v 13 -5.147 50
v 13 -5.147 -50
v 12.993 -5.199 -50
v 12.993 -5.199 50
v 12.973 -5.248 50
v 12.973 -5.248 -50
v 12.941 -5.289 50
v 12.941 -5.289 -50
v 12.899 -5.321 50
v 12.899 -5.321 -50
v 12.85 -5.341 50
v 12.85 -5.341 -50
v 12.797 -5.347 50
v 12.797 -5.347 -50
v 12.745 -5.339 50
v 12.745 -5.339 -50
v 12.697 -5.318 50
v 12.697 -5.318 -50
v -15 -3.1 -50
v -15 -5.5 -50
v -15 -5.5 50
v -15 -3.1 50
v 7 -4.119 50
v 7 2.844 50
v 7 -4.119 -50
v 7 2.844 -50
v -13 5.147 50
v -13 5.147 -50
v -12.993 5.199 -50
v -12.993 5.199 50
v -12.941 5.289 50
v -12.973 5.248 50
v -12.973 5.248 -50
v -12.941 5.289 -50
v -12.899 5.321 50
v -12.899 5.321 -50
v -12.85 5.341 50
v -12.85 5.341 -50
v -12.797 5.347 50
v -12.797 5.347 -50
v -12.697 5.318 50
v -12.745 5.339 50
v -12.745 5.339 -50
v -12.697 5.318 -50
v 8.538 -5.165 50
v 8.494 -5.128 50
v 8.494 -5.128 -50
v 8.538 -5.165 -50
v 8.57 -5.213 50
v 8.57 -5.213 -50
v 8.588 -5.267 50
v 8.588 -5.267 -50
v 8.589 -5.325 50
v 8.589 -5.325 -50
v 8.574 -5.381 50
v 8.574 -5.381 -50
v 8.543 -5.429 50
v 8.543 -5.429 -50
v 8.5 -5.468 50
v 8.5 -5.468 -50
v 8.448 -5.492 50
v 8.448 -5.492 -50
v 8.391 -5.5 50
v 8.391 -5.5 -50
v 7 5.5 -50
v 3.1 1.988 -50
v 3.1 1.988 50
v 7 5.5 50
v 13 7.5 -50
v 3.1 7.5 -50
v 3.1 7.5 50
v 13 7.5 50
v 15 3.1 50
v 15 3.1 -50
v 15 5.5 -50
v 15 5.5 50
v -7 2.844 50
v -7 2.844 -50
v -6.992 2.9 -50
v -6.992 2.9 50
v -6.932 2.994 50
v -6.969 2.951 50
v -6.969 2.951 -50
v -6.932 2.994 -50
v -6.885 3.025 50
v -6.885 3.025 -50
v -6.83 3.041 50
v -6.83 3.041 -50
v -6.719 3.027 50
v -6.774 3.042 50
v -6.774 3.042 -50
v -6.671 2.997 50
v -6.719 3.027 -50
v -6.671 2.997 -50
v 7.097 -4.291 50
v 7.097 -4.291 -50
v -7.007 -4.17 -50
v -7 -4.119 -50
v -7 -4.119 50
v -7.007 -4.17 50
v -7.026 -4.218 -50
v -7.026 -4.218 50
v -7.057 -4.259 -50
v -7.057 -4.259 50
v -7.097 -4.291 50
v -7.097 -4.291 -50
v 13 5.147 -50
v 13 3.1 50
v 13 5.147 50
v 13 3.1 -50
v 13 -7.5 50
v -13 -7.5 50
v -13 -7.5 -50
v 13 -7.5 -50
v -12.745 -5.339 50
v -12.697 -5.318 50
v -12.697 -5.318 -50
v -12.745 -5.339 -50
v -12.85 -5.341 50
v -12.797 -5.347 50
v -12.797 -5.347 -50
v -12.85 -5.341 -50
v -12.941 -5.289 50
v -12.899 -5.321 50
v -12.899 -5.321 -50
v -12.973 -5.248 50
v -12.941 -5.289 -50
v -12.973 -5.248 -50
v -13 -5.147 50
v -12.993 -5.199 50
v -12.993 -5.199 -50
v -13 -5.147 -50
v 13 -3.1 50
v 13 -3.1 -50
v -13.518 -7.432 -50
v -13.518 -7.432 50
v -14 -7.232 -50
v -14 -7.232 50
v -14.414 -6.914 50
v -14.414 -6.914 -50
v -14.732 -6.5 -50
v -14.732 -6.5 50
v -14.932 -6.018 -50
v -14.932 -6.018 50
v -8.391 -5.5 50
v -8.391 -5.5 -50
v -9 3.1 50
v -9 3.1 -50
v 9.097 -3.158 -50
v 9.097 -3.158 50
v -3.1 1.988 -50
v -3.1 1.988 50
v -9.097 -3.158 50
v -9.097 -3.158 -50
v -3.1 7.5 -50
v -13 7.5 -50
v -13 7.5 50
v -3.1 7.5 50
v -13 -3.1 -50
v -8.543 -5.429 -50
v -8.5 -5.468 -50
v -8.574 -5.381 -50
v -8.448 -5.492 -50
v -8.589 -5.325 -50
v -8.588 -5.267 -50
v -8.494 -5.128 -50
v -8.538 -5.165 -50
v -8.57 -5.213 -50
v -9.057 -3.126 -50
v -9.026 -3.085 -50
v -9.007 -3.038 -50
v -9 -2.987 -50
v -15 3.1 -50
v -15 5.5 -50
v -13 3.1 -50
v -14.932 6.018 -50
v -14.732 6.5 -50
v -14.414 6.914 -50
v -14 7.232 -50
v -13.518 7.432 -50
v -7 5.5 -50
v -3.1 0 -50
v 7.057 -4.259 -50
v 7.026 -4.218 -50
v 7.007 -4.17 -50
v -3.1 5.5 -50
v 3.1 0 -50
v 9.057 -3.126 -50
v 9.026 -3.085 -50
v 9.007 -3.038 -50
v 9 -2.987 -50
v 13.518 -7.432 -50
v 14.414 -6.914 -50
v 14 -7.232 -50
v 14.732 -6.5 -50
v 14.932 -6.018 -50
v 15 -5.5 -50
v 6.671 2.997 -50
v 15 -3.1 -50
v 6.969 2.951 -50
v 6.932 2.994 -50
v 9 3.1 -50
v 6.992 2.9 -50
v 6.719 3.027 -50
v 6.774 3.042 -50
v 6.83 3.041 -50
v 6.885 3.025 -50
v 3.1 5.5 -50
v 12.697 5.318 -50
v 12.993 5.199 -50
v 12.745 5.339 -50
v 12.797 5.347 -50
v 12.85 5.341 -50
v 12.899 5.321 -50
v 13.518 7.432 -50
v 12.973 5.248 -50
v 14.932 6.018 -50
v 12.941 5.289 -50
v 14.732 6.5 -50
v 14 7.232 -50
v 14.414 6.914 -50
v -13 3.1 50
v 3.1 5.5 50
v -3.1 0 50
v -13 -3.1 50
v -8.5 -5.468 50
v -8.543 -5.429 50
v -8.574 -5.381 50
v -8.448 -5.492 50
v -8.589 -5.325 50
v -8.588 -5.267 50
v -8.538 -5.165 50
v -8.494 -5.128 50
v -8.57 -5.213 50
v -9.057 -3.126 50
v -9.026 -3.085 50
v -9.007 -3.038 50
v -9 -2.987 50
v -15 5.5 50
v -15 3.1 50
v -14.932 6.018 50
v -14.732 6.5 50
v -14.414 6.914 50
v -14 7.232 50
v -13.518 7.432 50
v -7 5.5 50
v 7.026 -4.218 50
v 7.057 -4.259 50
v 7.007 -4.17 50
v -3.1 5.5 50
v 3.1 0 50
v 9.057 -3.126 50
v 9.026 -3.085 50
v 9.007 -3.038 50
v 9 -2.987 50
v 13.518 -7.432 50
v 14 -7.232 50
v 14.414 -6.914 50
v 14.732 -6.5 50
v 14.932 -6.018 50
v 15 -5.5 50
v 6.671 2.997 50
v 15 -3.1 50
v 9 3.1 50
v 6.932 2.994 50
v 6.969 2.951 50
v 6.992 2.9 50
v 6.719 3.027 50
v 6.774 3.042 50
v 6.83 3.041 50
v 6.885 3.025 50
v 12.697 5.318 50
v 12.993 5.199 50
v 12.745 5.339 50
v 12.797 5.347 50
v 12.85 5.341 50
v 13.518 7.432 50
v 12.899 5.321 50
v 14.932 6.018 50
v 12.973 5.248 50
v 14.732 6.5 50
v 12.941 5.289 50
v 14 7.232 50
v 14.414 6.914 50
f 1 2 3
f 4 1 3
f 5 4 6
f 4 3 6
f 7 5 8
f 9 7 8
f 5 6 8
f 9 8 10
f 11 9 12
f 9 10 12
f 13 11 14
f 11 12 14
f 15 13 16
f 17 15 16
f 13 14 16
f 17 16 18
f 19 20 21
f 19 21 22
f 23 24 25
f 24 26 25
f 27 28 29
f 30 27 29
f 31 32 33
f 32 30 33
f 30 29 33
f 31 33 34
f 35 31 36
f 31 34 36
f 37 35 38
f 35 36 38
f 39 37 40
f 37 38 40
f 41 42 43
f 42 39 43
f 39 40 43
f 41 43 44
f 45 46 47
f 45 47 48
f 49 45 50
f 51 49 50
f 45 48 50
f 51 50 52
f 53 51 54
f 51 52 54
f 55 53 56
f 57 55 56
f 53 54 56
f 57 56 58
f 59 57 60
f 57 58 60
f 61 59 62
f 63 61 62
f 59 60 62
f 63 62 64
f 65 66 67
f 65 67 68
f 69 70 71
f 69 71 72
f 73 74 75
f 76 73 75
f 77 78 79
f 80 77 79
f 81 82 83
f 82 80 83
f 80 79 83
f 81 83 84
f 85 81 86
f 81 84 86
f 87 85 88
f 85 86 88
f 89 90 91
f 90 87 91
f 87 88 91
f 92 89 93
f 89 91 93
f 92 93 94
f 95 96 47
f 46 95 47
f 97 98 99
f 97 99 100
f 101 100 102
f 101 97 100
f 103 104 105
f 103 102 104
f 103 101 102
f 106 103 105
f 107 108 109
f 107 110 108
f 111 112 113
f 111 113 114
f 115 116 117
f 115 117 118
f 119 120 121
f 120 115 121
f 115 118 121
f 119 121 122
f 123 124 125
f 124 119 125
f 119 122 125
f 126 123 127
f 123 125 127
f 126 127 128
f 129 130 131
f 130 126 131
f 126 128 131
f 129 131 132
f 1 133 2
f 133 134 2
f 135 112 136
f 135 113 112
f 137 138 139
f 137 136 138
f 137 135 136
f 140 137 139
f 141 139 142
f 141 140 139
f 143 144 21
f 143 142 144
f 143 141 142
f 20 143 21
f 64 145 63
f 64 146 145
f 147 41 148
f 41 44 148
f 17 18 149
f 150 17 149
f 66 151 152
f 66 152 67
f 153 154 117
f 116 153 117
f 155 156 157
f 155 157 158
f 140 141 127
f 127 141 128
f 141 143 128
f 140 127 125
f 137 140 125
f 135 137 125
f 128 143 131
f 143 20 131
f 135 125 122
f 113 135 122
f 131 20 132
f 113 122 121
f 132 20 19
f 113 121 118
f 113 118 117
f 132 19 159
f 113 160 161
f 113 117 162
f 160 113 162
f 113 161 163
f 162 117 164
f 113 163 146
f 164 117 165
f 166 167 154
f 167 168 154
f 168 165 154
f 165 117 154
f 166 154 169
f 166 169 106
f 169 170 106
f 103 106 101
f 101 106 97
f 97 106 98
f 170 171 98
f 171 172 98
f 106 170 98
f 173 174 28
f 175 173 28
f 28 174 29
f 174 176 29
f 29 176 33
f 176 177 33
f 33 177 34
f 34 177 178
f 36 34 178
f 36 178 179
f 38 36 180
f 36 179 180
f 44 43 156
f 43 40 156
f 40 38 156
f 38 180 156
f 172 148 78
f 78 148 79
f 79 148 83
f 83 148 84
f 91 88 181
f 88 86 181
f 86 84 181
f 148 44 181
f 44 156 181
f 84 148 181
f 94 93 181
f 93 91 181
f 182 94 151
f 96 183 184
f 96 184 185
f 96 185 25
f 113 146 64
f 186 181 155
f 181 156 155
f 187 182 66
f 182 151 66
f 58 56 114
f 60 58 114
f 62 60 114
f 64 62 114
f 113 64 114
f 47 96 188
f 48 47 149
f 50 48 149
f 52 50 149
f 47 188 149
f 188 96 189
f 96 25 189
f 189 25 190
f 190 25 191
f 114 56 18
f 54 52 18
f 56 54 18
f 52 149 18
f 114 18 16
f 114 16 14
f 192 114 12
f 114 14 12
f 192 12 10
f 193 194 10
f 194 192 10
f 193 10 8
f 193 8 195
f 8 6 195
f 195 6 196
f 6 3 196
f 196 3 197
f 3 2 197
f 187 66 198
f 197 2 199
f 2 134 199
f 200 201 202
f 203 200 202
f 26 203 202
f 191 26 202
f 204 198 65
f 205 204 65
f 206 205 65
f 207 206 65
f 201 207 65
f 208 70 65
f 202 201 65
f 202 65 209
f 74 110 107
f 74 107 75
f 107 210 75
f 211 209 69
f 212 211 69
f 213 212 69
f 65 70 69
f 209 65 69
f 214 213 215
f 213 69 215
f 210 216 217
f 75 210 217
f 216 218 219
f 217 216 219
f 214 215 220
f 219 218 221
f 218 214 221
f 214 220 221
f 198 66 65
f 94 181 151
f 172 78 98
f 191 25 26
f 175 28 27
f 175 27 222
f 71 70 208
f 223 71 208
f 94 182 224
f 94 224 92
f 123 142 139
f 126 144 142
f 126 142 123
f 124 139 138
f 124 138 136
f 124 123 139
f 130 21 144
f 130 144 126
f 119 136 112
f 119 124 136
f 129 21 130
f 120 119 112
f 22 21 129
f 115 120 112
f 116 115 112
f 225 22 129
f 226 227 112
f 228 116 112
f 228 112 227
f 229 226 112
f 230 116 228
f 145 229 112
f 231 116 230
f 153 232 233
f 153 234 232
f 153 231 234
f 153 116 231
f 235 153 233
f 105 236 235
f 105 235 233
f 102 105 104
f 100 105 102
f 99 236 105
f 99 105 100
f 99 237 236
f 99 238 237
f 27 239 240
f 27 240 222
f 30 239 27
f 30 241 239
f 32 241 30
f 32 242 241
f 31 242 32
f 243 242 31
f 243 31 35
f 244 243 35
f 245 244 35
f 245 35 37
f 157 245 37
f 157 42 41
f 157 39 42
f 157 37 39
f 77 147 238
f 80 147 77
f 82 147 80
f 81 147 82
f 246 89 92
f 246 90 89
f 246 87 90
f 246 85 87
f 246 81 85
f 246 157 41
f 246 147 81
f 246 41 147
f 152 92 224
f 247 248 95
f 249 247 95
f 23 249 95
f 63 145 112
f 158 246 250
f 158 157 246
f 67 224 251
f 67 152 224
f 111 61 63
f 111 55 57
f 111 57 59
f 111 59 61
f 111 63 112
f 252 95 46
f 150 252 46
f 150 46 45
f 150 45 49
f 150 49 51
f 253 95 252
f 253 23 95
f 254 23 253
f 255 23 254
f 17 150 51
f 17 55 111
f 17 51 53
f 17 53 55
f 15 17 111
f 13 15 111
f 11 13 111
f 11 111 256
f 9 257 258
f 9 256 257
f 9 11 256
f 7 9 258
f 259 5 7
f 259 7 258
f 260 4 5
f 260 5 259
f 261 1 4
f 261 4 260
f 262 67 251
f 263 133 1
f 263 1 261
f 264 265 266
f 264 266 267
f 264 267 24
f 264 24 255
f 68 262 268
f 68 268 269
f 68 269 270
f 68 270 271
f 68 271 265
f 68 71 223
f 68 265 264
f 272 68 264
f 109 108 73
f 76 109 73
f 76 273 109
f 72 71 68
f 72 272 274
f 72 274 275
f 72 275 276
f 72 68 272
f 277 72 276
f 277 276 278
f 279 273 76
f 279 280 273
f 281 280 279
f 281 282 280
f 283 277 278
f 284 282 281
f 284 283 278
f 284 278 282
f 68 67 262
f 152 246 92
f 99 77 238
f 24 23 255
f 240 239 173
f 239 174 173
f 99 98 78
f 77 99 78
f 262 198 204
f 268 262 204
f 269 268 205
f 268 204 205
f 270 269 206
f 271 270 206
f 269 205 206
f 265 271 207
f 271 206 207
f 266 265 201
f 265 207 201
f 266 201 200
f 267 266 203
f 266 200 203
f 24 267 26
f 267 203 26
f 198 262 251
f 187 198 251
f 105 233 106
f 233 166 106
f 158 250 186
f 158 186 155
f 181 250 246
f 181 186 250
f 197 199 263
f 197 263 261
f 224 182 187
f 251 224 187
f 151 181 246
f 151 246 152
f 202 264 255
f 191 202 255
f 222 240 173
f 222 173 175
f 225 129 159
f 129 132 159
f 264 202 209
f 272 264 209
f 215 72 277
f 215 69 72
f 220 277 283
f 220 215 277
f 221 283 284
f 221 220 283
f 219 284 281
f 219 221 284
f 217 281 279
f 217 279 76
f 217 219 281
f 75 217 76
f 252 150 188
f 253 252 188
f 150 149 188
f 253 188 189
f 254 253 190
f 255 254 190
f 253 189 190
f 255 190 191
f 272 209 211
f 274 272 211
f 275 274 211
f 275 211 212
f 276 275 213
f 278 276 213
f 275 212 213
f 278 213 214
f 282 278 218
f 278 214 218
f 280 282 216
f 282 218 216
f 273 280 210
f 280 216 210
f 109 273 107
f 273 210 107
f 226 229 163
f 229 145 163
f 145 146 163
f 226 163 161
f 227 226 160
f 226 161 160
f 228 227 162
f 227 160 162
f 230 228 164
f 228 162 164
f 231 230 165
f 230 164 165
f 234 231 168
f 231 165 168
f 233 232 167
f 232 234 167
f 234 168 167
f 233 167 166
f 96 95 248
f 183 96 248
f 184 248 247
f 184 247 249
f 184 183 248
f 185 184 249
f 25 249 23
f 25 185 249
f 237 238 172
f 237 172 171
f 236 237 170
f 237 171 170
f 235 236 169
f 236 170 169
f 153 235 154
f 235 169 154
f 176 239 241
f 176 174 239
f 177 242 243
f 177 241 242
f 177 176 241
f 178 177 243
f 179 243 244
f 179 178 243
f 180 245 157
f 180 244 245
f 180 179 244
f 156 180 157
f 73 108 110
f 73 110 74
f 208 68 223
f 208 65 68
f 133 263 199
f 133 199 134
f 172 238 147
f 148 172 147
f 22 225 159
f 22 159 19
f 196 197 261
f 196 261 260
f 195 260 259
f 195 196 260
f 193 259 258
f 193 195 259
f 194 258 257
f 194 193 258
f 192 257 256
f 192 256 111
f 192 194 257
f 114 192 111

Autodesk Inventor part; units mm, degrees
ref_plane "YZ Plane" through (0, 0, 0) normal (1, 0, 0) x (0, 1, 0)
ref_plane "XZ Plane" through (0, 0, 0) normal (0, 1, 0) x (-1, 0, 0)
ref_plane "XY Plane" through (0, 0, 0) normal (0, 0, 1) x (1, 0, 0)
sketch "Sketch1" plane through (0, 0, 0) normal (0, 0, 1) x (1, 0, 0)
  line L0 (-15, 7.5) -> (15, 7.5) construction
  line L1 (0, 11.0799) -> (0, -11.0799) projected
  line L2 (-15, 7.5) -> (-15, -7.5) construction
  line L3 (-15, 3.1) -> (-15, -3.1) construction
  line L4 (-15, 7.5) -> (-15, 3.1) construction
  line L5 (-15, 7.5) -> (-3.1, 7.5) construction
  line L6 (-15, 3.1) -> (-13, 3.1)
  line L7 (-3.1, 5.5) -> (-3.1, 7.5)
  line L8 (-13, 3.1) -> (-13, 5.5) construction
  line L9 (-15, 3.1) -> (-9, 3.1) construction
  line L10 (-13, 5.5) -> (-9, 3.1) construction
  line L11 (-9, 0) -> (-9, 3.1)
  line L12 (-21.4971, 0) -> (21.0828, 0) projected
  line L13 (-9, 0) -> (-9, -3.1) construction
  line L14 (-9, -3.1) -> (-13, -5.5) construction
  line L15 (-13, -5.5) -> (-13, -3.1) construction
  line L16 (-13, -3.1) -> (-15, -3.1)
  line L17 (-15, -3.1) -> (-15, -7.5) construction
  line L18 (-15, -7.5) -> (0, -7.5) construction
  line L19 (0, -7.5) -> (0, -5.5)
  line L20 (0, -5.5) -> (-9.1127, -5.5) construction
  line L21 (-9.1127, -5.5) -> (-7, -4.2324) construction
  line L22 (-7, -4.2324) -> (-7, 3.2725) construction
  line L23 (0, 0) -> (-3.1, 0)
  line L24 (-7, 3.2725) -> (-3.1, 0) construction
  line L25 (-3.1, 5.5) -> (-7, 5.5)
  line L26 (-7, 5.5) -> (-3.1, 1.9884)
  line L27 (-3.1, 1.9884) -> (0, 1.9884)
  line L28 (0, 1.9884) -> (0, 0)
  arc A0 (-13, 7.5) -> (-15, 5.5) centre (-13, 5.5) ccw
  line L29 (-13, 7.5) -> (-3.1, 7.5)
  line L30 (-15, 5.5) -> (-15, 3.1)
  arc A1 (-12.6971, 5.3183) -> (-13, 5.1468) centre (-12.8, 5.1468) ccw
  line L31 (-13, 5.1468) -> (-13, 3.1)
  line L32 (-12.6971, 5.3183) -> (-9, 3.1)
  arc A2 (-13, -5.1468) -> (-12.6971, -5.3183) centre (-12.8, -5.1468) ccw
  line L33 (-13, -5.1468) -> (-13, -3.1)
  line L34 (-12.6971, -5.3183) -> (-9, -3.1) construction
  arc A3 (-15, -5.5) -> (-13, -7.5) centre (-13, -5.5) ccw
  line L35 (-15, -5.5) -> (-15, -3.1)
  line L36 (-13, -7.5) -> (0, -7.5)
  arc A4 (-8.4935, -5.1285) -> (-8.3906, -5.5) centre (-8.3906, -5.3) ccw
  line L37 (-8.4935, -5.1285) -> (-7, -4.2324) construction
  line L38 (-8.3906, -5.5) -> (0, -5.5)
  arc A5 (-7.0971, -4.2906) -> (-7, -4.1191) centre (-7.2, -4.1191) ccw
  line L39 (-8.4935, -5.1285) -> (-7.0971, -4.2906)
  line L40 (-7, -4.1191) -> (-7, 3.2725) construction
  arc A6 (-9.0971, -3.1583) -> (-9, -2.9868) centre (-9.2, -2.9868) ccw
  line L41 (-9, -2.9868) -> (-9, 0)
  line L42 (-9.0971, -3.1583) -> (-12.6971, -5.3183)
  arc A7 (-6.6714, 2.9968) -> (-7, 2.8436) centre (-6.8, 2.8436) ccw
  line L43 (-7, -4.1191) -> (-7, 2.8436)
  line L44 (-3.1, 0) -> (-6.6714, 2.9968)
  line L45 (-3.1, 0) -> (0, 0)
  point P0 (0, 7.5)
  point P1 (-15, 0)
  dimension "d0" = 7.5
  dimension "d1" = 30
  dimension "d2" = 15
  dimension "d3" = 6.2
  dimension "d4" = 3.1
  dimension "d5" = 2
  dimension "d6" = 2.4
  dimension "d7" = 6
  dimension "d8" = 3.1
  dimension "d9" = 2
  dimension "d10" = 2
  dimension "d11" = 2
  dimension "d12" = 50
  dimension "d13" = 2
  dimension "outer_angle" = 2
  dimension "inner_angle" = 0.2
  dimension "d18" = 0.2
  dimension "d19" = 2
  dimension "d20" = 0.2
  dimension "d21" = 0.2
  dimension "d22" = 0.2
  dimension "d23" = 0.2
extrude "Extrusion2" add sketch "Sketch1" along normal mid plane 100 contours L1 L12 L44 A7 L43 L11 L32 A1 L31 L6 L30 A0 L29 L7 L25 L26 L27 | L1 L36 A3 L35 L16 L33 A2 L42 A6 L41 L12 L43 A5 L39 A4 L38
mirror "Mirror2" about plane through (0, 0, 0) normal (1, 0, 0) of "Extrusion2"
equation "\"d18\" = inner_angle"
equation "\"d19\" = outer_angle"
equation "\"d20\" = inner_angle"
equation "\"d21\" = inner_angle"
equation "\"d22\" = inner_angle"
equation "\"d23\" = inner_angle"
properties part number "profile_15x60"
